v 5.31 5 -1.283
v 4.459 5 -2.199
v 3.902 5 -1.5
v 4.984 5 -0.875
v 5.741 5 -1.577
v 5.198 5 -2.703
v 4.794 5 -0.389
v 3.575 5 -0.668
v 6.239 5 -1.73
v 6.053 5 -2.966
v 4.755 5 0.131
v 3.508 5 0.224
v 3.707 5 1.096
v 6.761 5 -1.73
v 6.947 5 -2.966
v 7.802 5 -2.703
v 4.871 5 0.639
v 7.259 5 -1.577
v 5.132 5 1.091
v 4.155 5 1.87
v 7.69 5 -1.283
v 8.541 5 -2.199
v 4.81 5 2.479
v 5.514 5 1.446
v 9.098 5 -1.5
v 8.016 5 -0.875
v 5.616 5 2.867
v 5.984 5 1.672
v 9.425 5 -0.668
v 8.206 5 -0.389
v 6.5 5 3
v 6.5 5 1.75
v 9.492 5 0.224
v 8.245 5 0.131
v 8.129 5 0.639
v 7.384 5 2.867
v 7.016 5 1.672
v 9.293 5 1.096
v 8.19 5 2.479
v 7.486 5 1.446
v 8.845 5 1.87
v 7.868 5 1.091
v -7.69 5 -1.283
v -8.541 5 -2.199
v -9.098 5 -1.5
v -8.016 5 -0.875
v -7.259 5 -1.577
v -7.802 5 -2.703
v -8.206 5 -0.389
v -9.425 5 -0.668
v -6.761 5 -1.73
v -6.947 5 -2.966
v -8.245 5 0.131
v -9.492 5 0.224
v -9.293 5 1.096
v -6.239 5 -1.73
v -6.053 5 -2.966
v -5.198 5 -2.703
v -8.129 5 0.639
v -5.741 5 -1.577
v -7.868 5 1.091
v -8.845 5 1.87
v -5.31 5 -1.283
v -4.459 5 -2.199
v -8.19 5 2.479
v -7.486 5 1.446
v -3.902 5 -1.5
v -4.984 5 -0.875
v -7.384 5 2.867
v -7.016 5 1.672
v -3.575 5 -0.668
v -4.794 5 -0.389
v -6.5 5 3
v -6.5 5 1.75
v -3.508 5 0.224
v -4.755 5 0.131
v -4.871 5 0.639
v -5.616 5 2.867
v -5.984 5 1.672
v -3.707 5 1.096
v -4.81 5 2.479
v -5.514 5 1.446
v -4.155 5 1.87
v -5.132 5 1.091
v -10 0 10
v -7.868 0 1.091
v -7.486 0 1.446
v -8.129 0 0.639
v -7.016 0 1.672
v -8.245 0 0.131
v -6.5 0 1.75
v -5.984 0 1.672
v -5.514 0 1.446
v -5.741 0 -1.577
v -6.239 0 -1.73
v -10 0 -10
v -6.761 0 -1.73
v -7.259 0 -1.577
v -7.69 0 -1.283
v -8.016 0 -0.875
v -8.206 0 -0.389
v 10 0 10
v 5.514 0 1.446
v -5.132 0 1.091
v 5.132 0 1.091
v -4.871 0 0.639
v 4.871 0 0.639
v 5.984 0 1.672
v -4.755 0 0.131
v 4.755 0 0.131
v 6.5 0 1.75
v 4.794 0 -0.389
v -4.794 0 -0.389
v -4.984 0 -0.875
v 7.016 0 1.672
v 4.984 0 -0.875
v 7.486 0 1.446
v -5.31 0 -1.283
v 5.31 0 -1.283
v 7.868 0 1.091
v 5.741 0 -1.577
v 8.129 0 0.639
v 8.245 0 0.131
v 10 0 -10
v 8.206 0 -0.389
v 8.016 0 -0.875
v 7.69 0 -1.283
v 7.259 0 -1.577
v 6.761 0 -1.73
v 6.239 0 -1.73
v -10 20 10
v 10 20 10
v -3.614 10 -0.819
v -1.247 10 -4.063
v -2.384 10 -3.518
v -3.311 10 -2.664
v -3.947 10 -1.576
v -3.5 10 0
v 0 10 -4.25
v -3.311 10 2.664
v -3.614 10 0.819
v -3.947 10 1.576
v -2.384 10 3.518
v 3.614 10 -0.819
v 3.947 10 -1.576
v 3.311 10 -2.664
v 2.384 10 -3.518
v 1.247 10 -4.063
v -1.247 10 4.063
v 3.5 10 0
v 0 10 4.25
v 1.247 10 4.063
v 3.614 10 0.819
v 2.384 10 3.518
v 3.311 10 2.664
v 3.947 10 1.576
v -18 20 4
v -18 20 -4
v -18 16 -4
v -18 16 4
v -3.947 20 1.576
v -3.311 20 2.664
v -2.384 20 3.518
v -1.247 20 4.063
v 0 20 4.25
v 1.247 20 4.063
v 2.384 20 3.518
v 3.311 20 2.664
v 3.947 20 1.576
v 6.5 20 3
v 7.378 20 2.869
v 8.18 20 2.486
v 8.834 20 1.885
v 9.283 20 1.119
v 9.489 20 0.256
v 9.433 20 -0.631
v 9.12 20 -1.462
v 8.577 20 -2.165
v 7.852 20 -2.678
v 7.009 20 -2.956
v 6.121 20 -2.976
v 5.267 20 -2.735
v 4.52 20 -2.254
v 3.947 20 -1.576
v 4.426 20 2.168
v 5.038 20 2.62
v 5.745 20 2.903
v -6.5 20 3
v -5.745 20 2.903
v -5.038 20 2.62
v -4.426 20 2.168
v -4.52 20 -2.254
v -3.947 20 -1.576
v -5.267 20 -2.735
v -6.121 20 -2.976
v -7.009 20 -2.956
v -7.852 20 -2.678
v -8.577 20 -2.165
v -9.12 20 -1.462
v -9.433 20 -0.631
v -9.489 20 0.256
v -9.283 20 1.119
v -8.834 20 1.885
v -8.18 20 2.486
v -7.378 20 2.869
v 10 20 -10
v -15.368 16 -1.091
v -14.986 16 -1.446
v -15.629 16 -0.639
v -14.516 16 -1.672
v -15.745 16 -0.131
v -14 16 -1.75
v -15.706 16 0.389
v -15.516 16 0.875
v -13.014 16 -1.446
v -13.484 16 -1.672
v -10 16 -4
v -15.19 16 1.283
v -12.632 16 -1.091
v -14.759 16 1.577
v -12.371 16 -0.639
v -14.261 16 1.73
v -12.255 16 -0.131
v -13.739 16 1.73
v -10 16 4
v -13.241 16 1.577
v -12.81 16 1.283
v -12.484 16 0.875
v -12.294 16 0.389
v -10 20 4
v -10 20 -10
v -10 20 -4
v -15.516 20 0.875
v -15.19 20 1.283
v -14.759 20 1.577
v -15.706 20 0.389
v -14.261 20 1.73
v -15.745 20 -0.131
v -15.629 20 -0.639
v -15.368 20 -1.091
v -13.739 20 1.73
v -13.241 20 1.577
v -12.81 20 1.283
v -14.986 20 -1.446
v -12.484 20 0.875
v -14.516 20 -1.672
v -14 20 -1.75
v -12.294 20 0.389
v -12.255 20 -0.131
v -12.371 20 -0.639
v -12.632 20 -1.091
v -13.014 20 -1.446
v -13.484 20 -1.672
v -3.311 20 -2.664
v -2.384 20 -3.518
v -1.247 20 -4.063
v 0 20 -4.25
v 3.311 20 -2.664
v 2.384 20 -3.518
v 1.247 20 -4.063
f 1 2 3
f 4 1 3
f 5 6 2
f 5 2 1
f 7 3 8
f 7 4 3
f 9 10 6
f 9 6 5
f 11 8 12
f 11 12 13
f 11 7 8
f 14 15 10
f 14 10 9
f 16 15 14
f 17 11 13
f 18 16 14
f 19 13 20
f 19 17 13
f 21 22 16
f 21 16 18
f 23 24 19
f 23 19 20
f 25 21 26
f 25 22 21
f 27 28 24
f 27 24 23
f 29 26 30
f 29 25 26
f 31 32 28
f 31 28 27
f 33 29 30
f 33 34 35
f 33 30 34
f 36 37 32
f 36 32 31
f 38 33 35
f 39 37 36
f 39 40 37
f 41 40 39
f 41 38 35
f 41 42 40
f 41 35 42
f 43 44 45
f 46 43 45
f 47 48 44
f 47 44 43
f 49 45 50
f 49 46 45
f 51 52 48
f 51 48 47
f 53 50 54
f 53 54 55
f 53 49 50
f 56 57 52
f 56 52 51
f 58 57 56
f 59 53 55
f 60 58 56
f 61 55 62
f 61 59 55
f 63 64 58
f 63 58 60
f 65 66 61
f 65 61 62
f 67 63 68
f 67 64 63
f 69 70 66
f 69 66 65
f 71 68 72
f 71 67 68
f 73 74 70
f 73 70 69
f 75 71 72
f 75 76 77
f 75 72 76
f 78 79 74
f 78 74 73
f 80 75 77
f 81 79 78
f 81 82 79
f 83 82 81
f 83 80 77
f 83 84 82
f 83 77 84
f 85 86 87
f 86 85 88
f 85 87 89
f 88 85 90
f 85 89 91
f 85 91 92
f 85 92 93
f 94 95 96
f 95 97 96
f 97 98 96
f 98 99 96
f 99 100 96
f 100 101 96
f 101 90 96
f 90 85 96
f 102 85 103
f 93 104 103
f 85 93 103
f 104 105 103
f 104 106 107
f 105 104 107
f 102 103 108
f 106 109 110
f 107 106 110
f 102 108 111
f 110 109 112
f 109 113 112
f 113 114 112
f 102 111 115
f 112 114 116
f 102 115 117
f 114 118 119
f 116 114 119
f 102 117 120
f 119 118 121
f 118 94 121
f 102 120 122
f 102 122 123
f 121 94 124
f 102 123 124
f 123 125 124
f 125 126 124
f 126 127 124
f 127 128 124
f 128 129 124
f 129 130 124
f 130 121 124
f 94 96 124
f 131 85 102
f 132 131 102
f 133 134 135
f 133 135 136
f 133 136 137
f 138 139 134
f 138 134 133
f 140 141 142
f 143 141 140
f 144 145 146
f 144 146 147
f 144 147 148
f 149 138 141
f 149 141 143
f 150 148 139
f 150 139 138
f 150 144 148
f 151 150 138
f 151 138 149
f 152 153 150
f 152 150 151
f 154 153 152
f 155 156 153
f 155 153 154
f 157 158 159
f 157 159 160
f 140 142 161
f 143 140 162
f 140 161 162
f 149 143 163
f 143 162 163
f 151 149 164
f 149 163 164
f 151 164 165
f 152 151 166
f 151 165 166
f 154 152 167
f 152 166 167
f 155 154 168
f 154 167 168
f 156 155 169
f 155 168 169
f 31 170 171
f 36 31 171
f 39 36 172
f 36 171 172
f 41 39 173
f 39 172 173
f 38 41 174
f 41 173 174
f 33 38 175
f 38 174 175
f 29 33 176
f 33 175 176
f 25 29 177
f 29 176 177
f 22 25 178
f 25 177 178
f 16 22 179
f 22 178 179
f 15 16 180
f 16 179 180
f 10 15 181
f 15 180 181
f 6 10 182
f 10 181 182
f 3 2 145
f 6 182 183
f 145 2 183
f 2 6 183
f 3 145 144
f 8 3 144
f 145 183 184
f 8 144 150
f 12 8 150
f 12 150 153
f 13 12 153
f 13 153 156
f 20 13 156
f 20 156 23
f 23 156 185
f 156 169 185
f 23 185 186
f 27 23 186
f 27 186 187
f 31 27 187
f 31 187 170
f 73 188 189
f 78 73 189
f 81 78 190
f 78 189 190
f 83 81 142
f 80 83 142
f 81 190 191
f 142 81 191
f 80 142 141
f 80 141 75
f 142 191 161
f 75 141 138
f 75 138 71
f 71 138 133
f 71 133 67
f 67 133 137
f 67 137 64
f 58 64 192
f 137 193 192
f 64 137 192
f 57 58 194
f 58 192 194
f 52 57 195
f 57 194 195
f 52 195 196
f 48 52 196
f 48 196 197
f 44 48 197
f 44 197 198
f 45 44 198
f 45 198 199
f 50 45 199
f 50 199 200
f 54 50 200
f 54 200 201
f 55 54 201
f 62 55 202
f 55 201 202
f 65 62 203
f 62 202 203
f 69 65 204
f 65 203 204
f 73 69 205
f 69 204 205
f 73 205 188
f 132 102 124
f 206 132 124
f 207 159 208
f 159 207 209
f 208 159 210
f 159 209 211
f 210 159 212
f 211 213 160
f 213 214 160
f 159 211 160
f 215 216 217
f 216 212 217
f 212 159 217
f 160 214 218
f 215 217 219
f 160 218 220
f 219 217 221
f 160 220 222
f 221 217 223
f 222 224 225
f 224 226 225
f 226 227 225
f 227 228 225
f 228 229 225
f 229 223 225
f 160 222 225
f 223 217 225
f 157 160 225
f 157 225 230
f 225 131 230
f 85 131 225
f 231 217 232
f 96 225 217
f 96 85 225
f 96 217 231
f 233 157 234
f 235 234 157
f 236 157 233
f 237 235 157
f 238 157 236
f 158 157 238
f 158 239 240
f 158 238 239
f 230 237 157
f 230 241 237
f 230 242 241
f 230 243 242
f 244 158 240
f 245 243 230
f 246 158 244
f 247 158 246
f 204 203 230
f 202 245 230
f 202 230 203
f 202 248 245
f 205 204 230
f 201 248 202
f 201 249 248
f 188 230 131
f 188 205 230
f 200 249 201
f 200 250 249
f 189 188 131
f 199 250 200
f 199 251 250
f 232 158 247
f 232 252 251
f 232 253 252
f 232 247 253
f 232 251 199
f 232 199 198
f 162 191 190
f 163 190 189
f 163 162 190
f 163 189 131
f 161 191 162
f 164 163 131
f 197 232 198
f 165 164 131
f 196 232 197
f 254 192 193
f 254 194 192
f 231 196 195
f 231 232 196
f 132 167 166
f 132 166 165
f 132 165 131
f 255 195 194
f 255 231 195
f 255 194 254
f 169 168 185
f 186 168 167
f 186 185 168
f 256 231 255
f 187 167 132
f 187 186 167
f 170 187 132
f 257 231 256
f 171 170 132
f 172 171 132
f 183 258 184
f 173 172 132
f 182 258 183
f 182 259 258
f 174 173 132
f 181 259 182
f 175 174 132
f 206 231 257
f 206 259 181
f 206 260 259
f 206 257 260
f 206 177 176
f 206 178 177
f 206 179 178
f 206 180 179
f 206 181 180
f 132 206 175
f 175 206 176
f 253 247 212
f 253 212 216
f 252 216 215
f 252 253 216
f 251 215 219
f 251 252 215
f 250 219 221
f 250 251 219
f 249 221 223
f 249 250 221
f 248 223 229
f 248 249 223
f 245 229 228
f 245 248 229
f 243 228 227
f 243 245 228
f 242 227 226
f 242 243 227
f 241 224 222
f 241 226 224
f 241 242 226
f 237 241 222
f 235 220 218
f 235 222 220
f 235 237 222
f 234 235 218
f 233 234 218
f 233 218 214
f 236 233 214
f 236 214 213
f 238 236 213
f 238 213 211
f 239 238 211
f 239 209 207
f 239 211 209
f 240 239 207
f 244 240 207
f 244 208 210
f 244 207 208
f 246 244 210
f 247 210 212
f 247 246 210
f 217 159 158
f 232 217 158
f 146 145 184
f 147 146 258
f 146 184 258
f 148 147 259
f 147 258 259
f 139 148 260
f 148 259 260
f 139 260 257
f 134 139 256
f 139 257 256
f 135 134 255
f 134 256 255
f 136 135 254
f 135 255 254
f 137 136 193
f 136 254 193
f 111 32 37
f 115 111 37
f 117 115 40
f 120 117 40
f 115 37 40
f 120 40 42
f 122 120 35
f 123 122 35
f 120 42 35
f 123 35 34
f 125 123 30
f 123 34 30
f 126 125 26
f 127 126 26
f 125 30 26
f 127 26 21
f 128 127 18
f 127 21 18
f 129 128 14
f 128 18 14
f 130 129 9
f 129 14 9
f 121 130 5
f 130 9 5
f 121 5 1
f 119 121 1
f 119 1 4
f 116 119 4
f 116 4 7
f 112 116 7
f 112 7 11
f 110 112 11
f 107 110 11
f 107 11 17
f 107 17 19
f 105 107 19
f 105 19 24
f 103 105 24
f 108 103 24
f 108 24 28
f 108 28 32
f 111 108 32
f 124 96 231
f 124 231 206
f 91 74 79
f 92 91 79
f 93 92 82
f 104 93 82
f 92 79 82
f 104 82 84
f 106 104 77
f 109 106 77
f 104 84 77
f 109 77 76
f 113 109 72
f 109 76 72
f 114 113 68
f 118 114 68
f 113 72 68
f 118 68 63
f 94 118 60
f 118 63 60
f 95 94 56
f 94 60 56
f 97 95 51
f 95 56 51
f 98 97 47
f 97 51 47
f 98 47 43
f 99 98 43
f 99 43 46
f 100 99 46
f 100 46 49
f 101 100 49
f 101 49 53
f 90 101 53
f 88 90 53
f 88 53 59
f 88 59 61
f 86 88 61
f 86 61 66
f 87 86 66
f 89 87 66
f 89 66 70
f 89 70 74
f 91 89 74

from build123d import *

# Parameters (mm, degrees)
SKETCH1_W               = 20
SKETCH1_H               = 20
BOSS_EXTRUDE1_DEPTH     = 20
SKETCH2_R               = 4.25
CUT_EXTRUDE1_DEPTH      = 10
SKETCH3_R               = 1.75
CUT_EXTRUDE2_DEPTH      = 25.494897428
SKETCH4_R               = 3
CUT_EXTRUDE3_DEPTH      = 15
SKETCH5_W               = 8
SKETCH5_H               = 4
BOSS_EXTRUDE2_DEPTH     = 8
CUT_EXTRUDE4_DEPTH      = 27.076809621
CUT_EXTRUDE4_DEPTH_BACK = 27.076809621
SKETCH6_R               = 1.75


with BuildPart() as part:
    # Sketch1 → Boss-Extrude1 (new body)
    with BuildSketch(Plane(origin=(0, 0, 0), x_dir=(1, 0, 0), z_dir=(0, 1, 0))):
        Rectangle(SKETCH1_W, SKETCH1_H)
    extrude(amount=BOSS_EXTRUDE1_DEPTH)

    # Sketch2 → Cut-Extrude1 (cut)
    with BuildSketch(Plane(origin=(0, 20, 0), x_dir=(1, 0, 0), z_dir=(0, 1, 0))):
        with Locations(Location((0, 0, 0), (0, 0, 270))):
            Circle(SKETCH2_R)
    extrude(amount=-CUT_EXTRUDE1_DEPTH, mode=Mode.SUBTRACT)

    # Sketch3 → Cut-Extrude2 (cut, through all)
    with BuildSketch(Plane(origin=(0, 20, 0), x_dir=(1, 0, 0), z_dir=(0, 1, 0))):
        with Locations(Location((-6.5, 0, 0), (0, 0, 270))):
            Circle(SKETCH3_R)
        with Locations(Location((6.5, 0, 0), (0, 0, 270))):
            Circle(SKETCH3_R)
    extrude(amount=-CUT_EXTRUDE2_DEPTH, mode=Mode.SUBTRACT)

    # Sketch4 → Cut-Extrude3 (cut)
    with BuildSketch(Plane(origin=(0, 20, 0), x_dir=(1, 0, 0), z_dir=(0, 1, 0))):
        with Locations(Location((-6.5, 0, 0), (0, 0, 270))):
            Circle(SKETCH4_R)
        with Locations(Location((6.5, 0, 0), (0, 0, 270))):
            Circle(SKETCH4_R)
    extrude(amount=-CUT_EXTRUDE3_DEPTH, mode=Mode.SUBTRACT)

    # Sketch5 → Boss-Extrude2 (add)
    with BuildSketch(Plane.ZY.offset(10)):
        with Locations((0, 18)):
            Rectangle(SKETCH5_W, SKETCH5_H)
    extrude(amount=BOSS_EXTRUDE2_DEPTH)

    # Sketch6 → Cut-Extrude4 (cut, two sides: drawn at the far end of the back side and taken through both)
    with BuildSketch(Plane.XZ.offset(-16).offset(-CUT_EXTRUDE4_DEPTH_BACK)):
        with Locations(Location((-14, 0, 0), (0, 0, 270))):
            Circle(SKETCH6_R)
    extrude(amount=CUT_EXTRUDE4_DEPTH + CUT_EXTRUDE4_DEPTH_BACK, mode=Mode.SUBTRACT)


solid = part.part
